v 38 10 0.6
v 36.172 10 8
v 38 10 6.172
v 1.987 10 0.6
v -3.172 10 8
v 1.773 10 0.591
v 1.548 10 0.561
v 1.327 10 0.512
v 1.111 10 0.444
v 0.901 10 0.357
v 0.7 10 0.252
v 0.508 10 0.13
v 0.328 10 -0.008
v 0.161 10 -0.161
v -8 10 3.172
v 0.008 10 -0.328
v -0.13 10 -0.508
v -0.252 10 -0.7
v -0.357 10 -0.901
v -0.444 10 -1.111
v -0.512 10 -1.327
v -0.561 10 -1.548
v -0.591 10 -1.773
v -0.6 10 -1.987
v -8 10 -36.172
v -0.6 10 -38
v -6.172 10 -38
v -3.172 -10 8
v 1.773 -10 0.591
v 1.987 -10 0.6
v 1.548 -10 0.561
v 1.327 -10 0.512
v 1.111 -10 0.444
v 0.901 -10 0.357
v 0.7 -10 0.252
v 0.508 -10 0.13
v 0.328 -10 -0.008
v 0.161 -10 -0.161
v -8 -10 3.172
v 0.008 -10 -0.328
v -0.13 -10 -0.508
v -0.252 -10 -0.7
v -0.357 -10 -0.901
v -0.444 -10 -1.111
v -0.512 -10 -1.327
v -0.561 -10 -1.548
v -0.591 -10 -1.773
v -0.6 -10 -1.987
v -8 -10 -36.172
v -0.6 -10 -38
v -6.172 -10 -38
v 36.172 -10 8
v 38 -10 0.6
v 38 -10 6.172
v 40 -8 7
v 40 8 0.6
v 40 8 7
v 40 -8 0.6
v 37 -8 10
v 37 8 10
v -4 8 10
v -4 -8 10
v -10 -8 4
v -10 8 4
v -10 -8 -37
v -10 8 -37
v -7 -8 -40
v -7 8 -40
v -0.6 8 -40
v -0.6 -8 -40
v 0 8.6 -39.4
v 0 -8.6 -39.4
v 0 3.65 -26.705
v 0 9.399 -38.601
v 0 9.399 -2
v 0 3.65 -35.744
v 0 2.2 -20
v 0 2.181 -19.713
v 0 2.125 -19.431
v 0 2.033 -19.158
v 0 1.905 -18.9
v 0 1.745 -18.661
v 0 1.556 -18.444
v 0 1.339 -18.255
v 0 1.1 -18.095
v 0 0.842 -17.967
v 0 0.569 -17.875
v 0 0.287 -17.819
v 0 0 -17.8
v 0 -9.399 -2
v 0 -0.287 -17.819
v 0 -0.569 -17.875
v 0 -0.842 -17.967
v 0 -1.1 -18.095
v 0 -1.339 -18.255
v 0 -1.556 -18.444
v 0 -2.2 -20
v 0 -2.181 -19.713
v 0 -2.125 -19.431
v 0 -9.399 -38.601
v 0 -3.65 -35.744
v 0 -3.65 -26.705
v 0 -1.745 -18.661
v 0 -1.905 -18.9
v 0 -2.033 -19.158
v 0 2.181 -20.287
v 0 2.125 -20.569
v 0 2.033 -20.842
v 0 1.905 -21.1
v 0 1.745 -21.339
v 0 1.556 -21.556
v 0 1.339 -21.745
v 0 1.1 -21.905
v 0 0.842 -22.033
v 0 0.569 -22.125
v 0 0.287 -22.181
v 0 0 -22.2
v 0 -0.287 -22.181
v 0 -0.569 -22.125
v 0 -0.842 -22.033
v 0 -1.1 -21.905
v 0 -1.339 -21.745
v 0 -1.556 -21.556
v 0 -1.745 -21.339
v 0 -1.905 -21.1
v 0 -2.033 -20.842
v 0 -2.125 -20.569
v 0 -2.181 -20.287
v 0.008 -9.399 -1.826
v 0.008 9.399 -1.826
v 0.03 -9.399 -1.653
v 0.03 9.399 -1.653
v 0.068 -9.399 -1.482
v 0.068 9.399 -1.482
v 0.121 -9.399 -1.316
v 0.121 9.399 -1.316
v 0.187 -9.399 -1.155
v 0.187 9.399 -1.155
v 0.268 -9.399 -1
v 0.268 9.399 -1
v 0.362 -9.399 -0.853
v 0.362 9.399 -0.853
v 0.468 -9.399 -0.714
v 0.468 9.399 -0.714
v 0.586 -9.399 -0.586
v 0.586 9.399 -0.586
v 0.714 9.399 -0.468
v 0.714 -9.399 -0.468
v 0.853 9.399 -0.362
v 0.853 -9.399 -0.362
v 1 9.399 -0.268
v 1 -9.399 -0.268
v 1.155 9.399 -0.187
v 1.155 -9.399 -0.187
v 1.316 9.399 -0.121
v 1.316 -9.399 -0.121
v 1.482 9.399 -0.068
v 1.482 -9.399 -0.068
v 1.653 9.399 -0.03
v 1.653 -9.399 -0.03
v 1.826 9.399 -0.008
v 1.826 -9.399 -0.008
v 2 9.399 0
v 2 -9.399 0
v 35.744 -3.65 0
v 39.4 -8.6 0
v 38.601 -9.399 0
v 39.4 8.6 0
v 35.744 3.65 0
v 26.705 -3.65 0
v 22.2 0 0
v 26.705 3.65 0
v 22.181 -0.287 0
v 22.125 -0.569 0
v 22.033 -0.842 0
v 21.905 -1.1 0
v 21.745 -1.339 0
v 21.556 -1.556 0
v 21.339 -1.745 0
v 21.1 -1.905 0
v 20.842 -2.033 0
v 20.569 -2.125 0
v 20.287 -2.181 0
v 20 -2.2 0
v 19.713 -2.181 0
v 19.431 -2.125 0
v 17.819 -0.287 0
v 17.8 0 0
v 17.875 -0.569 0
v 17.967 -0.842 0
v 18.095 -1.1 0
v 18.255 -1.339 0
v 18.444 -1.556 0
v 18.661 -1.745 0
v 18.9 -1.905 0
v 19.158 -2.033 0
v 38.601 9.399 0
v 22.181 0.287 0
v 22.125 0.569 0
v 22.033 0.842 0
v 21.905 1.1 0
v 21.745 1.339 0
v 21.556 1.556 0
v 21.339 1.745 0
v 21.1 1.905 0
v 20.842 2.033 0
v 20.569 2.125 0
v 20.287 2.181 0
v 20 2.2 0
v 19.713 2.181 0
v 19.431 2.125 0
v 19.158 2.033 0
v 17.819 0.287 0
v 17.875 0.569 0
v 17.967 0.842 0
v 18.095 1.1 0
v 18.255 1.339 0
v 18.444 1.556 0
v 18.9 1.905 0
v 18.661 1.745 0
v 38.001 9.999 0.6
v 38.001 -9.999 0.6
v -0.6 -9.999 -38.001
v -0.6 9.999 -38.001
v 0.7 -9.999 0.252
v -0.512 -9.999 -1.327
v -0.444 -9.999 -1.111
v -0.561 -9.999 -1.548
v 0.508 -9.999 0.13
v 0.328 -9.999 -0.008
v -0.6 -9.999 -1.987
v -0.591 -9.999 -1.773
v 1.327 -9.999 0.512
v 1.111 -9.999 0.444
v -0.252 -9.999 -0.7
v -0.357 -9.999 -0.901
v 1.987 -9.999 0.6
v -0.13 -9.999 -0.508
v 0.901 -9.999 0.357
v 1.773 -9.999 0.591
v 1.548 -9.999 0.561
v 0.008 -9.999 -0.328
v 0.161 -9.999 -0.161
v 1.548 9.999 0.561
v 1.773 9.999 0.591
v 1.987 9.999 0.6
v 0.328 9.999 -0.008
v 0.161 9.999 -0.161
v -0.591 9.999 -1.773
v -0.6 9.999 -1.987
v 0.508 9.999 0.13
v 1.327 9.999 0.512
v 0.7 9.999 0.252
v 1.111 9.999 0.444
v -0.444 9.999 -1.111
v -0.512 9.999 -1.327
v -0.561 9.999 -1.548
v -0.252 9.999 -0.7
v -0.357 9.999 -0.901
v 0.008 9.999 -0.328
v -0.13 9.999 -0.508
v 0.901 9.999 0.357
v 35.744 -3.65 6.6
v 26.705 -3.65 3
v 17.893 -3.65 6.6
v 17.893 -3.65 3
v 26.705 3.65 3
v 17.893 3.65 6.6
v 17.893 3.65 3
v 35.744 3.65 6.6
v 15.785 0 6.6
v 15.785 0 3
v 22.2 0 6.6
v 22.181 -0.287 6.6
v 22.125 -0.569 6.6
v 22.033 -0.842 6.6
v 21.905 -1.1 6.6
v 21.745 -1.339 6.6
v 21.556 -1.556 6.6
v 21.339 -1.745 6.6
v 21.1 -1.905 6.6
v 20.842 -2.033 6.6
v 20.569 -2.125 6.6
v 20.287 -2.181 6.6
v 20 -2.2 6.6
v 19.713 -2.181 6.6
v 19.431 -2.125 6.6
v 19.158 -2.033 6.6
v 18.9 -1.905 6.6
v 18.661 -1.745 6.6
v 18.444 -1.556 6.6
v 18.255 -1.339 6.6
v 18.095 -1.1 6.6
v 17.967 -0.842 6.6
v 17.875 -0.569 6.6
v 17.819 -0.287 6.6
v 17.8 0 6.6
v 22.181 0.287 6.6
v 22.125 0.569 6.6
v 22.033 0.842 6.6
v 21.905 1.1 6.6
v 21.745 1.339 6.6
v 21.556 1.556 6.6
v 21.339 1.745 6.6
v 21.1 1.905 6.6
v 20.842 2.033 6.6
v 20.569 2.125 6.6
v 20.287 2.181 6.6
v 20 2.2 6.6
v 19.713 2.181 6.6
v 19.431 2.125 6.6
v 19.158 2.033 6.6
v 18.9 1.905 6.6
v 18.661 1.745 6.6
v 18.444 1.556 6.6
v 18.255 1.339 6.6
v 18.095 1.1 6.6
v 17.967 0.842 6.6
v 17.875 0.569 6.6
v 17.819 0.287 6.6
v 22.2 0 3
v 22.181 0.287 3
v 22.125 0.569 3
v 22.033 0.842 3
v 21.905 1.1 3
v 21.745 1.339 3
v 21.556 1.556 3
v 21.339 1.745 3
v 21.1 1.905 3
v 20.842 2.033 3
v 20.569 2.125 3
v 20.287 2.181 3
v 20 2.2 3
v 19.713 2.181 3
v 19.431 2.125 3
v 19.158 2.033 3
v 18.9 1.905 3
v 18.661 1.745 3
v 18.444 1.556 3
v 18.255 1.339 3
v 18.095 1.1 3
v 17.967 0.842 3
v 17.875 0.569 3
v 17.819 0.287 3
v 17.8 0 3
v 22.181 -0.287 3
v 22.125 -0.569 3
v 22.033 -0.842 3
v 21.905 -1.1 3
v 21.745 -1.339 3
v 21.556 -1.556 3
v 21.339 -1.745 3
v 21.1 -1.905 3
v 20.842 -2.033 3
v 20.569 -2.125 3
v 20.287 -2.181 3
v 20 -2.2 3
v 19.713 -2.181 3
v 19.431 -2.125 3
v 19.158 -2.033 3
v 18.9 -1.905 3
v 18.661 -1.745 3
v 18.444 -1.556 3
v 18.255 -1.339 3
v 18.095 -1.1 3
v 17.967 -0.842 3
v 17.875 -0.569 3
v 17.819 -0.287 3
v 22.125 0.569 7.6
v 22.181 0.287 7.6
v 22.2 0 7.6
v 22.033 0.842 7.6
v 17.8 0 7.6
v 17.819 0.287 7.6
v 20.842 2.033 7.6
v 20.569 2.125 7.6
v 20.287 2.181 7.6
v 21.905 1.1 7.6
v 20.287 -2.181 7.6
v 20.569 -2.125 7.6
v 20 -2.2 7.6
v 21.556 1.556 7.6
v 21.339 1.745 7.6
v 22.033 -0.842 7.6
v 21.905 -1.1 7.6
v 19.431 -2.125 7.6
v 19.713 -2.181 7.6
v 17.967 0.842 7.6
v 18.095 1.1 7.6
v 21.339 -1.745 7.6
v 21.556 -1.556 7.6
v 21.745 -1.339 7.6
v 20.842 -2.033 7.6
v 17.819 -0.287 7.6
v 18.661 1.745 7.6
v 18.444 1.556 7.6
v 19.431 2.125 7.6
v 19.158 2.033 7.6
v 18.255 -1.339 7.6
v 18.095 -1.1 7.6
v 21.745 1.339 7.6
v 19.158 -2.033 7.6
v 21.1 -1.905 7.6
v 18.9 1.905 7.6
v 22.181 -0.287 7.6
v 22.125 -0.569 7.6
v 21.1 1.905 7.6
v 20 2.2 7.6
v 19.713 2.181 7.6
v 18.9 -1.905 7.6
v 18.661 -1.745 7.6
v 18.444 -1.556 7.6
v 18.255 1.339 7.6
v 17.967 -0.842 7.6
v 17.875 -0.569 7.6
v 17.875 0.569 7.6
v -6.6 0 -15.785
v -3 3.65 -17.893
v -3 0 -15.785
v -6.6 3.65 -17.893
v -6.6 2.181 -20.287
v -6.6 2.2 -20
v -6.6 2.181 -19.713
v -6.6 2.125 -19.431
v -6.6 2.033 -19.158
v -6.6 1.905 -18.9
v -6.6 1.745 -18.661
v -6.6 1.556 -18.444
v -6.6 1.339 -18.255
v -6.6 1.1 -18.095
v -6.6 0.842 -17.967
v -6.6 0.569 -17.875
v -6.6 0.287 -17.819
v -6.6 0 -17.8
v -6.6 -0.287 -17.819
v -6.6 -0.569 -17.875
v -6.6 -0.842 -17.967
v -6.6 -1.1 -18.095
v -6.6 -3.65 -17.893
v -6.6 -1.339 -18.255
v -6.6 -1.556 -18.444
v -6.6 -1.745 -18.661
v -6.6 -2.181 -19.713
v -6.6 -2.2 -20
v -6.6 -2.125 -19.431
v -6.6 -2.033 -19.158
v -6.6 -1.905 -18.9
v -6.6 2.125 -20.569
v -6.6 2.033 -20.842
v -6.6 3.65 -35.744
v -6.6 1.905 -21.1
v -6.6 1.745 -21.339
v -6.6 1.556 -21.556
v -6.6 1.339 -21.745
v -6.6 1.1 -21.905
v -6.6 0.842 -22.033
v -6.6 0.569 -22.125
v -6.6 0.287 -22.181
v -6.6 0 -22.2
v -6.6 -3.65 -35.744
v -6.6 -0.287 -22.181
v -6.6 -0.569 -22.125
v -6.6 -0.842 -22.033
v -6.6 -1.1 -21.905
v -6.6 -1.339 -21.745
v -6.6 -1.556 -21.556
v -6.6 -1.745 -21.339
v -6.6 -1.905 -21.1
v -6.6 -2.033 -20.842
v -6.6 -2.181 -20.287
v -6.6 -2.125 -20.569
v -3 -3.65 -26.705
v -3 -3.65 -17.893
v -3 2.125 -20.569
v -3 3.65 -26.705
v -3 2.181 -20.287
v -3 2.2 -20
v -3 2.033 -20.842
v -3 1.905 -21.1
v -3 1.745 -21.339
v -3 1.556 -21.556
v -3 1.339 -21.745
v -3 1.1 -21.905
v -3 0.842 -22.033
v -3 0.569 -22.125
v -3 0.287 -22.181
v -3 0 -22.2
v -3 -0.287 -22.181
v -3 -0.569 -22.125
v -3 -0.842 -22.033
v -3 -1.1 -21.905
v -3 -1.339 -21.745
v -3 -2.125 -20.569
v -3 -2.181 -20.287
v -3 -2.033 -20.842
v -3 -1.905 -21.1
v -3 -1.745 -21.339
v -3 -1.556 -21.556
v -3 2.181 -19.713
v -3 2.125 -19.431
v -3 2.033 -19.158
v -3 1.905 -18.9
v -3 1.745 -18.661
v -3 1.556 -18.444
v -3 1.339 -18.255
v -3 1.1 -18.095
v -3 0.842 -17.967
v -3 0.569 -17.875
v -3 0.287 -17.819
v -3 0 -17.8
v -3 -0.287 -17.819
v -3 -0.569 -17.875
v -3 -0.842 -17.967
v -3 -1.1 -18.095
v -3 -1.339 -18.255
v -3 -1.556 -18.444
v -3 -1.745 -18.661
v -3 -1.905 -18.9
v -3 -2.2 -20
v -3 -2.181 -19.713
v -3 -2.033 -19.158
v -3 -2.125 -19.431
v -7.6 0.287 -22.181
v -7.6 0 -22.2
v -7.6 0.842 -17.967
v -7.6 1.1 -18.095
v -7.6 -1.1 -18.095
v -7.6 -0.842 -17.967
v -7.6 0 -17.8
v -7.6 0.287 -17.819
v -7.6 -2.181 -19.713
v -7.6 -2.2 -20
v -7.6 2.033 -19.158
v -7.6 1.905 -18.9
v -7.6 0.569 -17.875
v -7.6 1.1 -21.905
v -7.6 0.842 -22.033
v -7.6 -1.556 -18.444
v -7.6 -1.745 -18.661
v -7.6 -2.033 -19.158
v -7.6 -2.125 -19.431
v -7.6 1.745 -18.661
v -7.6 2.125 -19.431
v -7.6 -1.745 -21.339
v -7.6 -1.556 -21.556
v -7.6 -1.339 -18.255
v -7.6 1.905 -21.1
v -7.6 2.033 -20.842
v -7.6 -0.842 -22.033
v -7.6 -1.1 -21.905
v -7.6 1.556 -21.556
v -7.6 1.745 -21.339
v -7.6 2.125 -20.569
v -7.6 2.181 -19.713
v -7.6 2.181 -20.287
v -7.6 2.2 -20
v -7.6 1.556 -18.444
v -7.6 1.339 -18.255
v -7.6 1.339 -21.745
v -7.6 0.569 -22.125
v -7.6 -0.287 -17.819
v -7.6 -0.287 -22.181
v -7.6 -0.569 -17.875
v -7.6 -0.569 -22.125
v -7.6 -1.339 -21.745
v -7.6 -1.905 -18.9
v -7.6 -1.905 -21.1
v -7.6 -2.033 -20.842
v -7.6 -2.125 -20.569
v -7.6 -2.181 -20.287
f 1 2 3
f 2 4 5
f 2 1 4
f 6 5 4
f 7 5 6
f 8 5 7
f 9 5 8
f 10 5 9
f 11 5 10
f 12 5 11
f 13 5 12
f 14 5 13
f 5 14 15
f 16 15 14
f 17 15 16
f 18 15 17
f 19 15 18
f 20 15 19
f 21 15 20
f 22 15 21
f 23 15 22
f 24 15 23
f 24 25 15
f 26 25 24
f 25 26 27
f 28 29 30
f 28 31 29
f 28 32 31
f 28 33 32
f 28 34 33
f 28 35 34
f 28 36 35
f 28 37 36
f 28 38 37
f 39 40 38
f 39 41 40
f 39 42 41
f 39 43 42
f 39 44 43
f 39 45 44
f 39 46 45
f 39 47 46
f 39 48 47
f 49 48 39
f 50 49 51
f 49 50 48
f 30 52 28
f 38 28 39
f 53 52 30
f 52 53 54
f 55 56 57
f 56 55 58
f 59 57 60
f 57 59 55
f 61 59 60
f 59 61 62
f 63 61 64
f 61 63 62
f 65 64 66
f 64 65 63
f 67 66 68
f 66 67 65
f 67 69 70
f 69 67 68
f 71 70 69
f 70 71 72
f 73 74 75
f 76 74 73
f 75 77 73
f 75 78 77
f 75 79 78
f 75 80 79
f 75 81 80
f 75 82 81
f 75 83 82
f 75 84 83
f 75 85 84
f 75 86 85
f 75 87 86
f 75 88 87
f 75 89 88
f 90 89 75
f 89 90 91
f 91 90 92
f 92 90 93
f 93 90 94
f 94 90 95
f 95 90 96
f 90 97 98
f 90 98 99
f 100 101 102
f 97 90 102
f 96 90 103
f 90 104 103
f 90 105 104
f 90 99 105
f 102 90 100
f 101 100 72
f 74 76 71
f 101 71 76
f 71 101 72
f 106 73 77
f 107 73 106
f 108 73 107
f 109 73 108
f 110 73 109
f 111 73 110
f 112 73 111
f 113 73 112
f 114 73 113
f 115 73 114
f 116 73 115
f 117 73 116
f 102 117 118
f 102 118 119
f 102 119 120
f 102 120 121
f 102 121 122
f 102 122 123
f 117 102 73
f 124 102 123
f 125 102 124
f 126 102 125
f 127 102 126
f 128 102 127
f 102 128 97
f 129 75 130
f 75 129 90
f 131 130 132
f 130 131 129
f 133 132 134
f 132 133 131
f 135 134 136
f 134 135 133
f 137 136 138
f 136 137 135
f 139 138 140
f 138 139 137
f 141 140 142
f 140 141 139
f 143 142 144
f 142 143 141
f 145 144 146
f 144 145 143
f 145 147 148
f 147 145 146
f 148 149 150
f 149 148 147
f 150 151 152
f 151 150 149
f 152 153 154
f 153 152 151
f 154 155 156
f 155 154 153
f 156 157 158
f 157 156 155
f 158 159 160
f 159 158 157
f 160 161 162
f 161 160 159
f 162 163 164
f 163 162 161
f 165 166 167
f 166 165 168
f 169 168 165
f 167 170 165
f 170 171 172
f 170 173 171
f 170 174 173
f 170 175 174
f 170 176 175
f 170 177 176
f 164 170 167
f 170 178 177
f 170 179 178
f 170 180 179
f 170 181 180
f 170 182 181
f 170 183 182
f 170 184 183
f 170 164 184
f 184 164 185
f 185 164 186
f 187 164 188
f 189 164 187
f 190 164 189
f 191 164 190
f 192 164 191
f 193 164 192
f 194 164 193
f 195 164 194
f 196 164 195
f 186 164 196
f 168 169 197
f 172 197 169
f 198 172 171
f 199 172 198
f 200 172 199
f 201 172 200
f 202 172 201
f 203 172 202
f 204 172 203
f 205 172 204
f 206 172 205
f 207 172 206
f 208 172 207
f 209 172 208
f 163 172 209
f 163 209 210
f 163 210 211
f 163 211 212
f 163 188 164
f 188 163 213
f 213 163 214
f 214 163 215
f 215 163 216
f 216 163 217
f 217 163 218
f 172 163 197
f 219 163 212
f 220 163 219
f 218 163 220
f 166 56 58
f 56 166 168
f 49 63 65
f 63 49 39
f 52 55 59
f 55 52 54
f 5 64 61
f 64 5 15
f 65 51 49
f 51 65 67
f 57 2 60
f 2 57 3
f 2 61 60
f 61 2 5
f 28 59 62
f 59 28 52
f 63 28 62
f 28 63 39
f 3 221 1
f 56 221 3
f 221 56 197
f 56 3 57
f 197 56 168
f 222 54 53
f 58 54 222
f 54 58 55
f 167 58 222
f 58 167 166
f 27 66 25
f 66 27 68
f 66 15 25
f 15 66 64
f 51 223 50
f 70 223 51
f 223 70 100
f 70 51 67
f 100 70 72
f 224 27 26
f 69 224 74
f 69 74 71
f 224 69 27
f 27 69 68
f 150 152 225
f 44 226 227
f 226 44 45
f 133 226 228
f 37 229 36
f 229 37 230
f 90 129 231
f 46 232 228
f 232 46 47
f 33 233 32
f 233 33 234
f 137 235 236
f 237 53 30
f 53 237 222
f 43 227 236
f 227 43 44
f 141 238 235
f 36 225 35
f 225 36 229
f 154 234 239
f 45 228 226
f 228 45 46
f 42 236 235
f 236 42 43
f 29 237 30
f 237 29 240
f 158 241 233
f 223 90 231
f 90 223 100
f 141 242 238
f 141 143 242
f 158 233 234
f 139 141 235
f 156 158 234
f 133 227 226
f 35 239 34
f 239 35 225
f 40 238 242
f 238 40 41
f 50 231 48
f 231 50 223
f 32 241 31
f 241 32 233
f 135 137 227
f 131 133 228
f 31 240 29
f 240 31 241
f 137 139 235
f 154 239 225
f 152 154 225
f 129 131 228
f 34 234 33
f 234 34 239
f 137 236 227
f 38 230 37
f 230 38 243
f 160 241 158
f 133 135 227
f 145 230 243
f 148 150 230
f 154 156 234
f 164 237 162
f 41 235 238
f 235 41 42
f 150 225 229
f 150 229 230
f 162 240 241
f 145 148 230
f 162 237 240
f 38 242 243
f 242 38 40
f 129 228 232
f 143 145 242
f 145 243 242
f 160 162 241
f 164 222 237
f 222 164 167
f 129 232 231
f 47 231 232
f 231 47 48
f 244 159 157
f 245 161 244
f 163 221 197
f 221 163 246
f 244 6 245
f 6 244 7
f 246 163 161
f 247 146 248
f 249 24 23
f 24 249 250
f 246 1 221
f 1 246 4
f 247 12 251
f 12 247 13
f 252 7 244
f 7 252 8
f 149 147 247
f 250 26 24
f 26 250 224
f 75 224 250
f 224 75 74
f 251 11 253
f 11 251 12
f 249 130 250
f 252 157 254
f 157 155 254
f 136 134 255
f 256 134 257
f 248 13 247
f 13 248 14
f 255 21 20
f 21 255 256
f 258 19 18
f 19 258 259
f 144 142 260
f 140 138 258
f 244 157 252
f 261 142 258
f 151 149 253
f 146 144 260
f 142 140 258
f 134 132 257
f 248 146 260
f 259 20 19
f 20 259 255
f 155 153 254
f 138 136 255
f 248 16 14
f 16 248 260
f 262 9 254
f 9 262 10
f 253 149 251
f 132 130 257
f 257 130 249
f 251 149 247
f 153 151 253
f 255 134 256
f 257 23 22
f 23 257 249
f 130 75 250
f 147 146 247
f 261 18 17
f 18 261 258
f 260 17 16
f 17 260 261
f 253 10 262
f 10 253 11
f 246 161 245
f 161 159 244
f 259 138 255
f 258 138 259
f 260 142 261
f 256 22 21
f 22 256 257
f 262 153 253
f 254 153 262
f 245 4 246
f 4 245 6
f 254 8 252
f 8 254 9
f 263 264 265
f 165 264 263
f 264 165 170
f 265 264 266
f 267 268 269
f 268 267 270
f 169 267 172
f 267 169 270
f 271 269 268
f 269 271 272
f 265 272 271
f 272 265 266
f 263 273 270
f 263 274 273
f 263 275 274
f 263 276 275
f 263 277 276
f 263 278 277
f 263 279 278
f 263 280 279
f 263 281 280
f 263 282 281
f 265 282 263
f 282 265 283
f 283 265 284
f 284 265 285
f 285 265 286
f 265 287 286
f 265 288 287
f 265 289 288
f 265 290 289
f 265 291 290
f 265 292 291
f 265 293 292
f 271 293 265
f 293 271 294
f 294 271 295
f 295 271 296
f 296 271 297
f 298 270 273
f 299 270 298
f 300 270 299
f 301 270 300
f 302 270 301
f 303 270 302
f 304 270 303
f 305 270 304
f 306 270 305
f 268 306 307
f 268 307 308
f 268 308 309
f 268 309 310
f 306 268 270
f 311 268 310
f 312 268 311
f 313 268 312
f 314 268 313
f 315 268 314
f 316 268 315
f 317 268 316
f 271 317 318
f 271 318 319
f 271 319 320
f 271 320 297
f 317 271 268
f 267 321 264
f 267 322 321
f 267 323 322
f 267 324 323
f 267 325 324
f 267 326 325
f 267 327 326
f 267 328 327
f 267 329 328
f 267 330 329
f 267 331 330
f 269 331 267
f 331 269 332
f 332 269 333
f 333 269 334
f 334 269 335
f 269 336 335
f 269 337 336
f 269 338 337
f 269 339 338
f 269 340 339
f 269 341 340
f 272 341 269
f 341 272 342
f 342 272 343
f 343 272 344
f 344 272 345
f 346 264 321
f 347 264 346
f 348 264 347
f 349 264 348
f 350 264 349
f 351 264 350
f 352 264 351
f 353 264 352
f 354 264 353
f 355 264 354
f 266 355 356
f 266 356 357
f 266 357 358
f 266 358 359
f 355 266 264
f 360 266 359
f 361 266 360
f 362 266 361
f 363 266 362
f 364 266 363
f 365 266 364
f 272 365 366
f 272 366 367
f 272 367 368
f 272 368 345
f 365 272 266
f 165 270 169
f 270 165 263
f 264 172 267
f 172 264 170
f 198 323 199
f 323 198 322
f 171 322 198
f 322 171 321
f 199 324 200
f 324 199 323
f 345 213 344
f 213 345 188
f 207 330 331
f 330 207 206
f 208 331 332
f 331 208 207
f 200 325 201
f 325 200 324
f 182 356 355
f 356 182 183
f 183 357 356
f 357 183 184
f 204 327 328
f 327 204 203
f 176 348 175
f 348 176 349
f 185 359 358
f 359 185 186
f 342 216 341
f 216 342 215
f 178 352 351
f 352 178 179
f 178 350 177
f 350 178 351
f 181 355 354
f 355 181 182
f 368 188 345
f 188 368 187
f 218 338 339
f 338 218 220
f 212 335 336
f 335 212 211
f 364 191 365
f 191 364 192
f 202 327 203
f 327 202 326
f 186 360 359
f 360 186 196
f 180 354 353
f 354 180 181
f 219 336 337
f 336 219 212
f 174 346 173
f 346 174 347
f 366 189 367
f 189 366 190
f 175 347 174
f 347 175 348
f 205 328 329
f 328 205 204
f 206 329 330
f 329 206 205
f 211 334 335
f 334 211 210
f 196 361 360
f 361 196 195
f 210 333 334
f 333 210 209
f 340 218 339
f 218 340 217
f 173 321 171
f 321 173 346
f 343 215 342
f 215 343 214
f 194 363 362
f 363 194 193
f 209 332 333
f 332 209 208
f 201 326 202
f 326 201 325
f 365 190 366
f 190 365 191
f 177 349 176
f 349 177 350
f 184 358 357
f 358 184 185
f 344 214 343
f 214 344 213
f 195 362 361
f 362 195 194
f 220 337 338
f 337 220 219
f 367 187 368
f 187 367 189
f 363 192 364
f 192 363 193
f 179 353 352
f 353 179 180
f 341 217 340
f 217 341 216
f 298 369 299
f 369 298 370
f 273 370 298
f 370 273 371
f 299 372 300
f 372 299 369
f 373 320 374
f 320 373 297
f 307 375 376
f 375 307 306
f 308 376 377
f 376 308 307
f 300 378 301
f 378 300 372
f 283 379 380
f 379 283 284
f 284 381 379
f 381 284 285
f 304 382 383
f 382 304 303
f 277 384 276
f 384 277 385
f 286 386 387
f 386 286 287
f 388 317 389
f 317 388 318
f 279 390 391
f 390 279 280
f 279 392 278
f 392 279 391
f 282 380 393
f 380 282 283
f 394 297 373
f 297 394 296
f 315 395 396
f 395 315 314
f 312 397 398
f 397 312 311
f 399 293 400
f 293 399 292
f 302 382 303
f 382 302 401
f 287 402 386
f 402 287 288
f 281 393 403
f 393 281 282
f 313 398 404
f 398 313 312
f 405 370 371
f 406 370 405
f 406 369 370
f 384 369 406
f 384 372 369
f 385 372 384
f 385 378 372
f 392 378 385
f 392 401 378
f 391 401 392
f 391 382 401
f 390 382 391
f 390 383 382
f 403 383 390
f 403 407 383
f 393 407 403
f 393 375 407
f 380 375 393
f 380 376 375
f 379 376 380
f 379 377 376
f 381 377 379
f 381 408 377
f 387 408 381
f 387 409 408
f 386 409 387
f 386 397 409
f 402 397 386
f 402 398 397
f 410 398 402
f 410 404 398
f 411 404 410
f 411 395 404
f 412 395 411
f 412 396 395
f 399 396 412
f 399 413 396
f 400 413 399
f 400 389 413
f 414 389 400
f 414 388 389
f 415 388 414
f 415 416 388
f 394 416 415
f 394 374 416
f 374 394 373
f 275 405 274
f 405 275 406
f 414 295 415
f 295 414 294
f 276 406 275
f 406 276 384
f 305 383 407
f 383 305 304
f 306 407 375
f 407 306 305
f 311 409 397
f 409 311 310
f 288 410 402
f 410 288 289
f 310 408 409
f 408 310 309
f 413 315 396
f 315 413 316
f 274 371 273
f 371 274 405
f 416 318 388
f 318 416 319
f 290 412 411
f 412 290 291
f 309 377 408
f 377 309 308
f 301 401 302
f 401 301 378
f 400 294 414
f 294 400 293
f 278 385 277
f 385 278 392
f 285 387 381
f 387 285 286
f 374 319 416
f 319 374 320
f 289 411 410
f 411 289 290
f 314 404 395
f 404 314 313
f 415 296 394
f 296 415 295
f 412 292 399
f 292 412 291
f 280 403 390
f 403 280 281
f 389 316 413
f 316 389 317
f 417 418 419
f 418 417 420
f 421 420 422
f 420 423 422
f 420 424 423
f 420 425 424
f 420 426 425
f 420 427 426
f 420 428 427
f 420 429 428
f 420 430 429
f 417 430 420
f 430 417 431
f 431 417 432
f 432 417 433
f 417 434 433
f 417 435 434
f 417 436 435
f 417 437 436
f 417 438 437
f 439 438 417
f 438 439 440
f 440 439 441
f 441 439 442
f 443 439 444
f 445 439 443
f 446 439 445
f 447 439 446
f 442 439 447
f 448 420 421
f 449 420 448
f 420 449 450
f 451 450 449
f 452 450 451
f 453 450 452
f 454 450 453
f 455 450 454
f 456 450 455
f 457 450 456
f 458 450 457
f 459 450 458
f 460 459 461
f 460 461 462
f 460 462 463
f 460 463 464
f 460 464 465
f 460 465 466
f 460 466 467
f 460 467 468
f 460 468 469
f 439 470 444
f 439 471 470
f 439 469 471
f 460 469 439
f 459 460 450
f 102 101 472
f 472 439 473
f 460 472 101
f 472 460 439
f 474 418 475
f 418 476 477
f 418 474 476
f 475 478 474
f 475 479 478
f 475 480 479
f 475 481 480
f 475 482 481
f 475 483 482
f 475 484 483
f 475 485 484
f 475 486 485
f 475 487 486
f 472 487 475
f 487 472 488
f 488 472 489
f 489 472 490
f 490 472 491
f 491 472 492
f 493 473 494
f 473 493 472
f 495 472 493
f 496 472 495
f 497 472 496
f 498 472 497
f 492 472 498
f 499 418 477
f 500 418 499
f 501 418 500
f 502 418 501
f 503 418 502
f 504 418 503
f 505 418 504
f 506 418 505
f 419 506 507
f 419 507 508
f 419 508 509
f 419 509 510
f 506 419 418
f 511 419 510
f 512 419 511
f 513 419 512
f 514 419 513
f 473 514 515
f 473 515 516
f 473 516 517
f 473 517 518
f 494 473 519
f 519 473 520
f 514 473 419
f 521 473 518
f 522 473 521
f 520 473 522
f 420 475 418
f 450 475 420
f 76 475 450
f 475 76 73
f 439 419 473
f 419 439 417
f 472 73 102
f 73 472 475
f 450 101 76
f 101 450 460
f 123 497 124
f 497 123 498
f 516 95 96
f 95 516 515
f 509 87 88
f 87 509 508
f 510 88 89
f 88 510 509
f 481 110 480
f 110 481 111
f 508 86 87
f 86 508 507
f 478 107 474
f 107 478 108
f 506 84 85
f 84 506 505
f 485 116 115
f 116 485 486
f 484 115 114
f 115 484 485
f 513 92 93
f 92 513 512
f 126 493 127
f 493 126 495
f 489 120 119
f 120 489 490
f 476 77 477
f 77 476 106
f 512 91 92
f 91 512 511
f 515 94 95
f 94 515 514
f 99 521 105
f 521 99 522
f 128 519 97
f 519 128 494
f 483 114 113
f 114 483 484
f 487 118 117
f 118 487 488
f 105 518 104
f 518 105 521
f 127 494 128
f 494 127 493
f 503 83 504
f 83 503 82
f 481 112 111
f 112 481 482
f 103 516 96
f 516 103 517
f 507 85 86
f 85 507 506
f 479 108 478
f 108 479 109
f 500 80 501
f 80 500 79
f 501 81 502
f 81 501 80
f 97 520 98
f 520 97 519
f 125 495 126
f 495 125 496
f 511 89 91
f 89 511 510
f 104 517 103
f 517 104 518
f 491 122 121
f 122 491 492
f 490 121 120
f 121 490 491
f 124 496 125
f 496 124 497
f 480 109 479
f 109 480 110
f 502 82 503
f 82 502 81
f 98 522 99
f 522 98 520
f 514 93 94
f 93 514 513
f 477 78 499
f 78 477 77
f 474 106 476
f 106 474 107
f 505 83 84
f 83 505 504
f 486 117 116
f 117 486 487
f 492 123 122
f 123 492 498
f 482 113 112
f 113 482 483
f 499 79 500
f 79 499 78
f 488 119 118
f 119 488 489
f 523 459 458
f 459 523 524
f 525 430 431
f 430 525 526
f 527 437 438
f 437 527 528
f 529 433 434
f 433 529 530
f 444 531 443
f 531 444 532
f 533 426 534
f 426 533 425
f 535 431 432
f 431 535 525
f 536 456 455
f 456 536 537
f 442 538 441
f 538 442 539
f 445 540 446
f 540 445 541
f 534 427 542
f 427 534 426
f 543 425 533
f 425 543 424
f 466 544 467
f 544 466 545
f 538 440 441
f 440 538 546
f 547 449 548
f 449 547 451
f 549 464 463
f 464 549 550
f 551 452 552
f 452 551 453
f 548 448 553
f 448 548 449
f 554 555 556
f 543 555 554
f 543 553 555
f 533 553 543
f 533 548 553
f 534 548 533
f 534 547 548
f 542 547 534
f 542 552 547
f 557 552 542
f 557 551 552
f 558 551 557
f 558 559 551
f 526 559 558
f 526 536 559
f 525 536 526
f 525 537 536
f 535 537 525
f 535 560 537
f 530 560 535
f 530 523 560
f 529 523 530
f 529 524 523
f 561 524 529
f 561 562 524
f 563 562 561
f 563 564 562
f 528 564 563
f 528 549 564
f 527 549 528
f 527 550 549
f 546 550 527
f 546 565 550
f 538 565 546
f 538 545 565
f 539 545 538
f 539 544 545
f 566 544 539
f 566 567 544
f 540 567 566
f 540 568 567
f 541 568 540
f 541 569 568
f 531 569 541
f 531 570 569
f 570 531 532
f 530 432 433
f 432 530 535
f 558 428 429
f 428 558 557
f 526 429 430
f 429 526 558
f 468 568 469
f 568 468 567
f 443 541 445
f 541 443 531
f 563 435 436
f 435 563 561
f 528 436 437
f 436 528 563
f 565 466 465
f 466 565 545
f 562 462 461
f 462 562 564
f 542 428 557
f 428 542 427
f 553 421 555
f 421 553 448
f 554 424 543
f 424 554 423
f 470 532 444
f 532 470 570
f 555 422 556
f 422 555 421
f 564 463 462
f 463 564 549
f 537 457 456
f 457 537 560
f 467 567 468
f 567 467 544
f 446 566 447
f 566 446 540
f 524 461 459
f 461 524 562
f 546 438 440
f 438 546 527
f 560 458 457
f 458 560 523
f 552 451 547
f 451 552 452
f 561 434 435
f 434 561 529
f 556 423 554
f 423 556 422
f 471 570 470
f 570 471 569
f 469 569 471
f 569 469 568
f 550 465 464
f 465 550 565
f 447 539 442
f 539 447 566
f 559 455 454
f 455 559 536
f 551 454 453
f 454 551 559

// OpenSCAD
// file: inspection.scad
// Optional section clipping for OpenSCAD Customizer inspection.
// The bracket's default "None" mode passes the geometry through unchanged.
// For X/Y/Z, intersect geometry with a slab of the requested depth in mm.
module util_section_inspect(axis = "None", position_mm = 0, depth_mm = 10, direction = "Positive") {
    if (axis == "None")
        children();
    else {
        extent = 10000;
        low = (direction == "Negative") ? position_mm - depth_mm : position_mm;
        intersection() {
            children();
            if (axis == "X")
                translate([low, -extent / 2, -extent / 2])
                    cube([depth_mm, extent, extent]);
            else if (axis == "Y")
                translate([-extent / 2, low, -extent / 2])
                    cube([extent, depth_mm, extent]);
            else if (axis == "Z")
                translate([-extent / 2, -extent / 2, low])
                    cube([extent, extent, depth_mm]);
        }
    }
}
// main file
// Outside-corner L bracket for plywood joints.
// All dimensions are in millimetres. Adjust settings in the OpenSCAD Customizer.
//
// Side view (X to the right, Z upwards), with wood inside the bracket:
//
//     ____________________        <- bracket, top arm (outside the horizontal panel)
//    /  ##################
//   |  ||==================      <- horizontal plywood panel (10 mm)
//   |  ||
//   |  ||  vertical plywood panel
//   |  ||
//    bracket, vertical arm (outside the upright panel)
//
// Bolts enter from inside the plywood and thread into captive nuts in the bracket.
// Insert a nut through the access window on the wood-facing side of the bracket,
// slide it under the 3 mm retaining wall and push it against the stop.
// Hook the plug tab under the retaining lip, then press the opposite end down.
// The plywood covers the window; the outside face of the bracket stays solid.
//
// PRINTING: put the bracket on one flat side and the plugs on their sides.
// This lets layer lines follow the part outlines for improved strength.
//
// Requires inspection.scad in this directory for the optional section view.

use <inspection.scad>

/* [Display] */
part       = "bracket"; // [bracket, plug]
show_wood  = true;     // translucent plywood preview; excluded from STL
show_plugs = false;    // display fitted plugs; excluded from STL
part_color = [0.29, 0.56, 0.72]; // color
plug_color = [0.93, 0.58, 0.22]; // color

/* [Section inspection] */
c_section_axis        = "None";     // [None, X, Y, Z]
c_section_position_mm = 0;          // [-60:0.5:60]
c_section_depth_mm    = 10;         // [0.1:0.1:80]
c_section_direction   = "Positive"; // [Positive, Negative]

/* [Plywood] */
ply_t    = 10;     // plywood thickness
wood_w   = 60;     // panel width, display only
wood_len = 80;     // panel length, display only

/* [Bracket geometry] */
W        = 20;     // bracket width
t        = 10;     // bracket wall thickness
armH     = 40;     // length of top arm from the outer plywood end
armV     = 40;     // length of vertical arm from the top of horizontal plywood
ce       = 6;      // 45-degree outer corner chamfer (6 gives 9.9 mm diagonal wall)
c        = 3;      // 45-degree chamfer at outer arm ends
cs       = 2;      // 45-degree side-edge chamfers; 0 disables

/* [Print compensation] */
ef       = 0.6;    // 45-degree elephant-foot relief on print-facing sides; 0 disables
r_in     = 2.0;    // inside corner radius: plywood must be rounded at least this much; 0 or >=1

/* [Bolt and captive nut] */
bolt_edge = 10;    // bolt position beyond the inner face of the other panel
nut_type  = "hex"; // [hex, square]
bolt_d    = 4;
bolt_clr  = 0.4;   // bolt-hole clearance
nut_flats = 7;     // M4 nut across flats; measure your actual nuts
nut_h     = 3.2;   // nominal M4 nut thickness
nut_clr   = 0.3;   // captive-nut pocket clearance
wood_wall = 3;     // load-bearing wall between plywood and nut
tip_hole  = 1;     // blind hole for extra bolt length beyond the nut
                   // (M4x16 nominal fit; outer skin = t - wood_wall - pocket_h - tip_hole)

/* [Window plug] */
plug_clr    = 0.15; // clearance around access plug
lip_len     = 2.5;  // free slot from captive nut to window for plug's hooked tab
lip_thk     = 2.4;  // tab thickness
win_extra   = 0.6;  // extra window length to allow angled plug insertion
plug_ch     = 1.0;  // 45-degree bevel on far end of plug for insertion
plug_handle = "hole"; // [hole, slot, none] hole = pin/screw opening, slot = screwdriver notch

/* [Hidden] */
$fn = 48;

// ---------- Derived dimensions ----------
Wn       = nut_flats + nut_clr;   // nut pocket width (across flats)
Ln       = (nut_type == "hex") ? Wn / cos(30) : Wn;   // pocket length (hex vertex-to-vertex)
pocket_h = nut_h + 0.4;           // nut-pocket depth
skin     = t - wood_wall - pocket_h - tip_hole;   // closed outside wall
D        = wood_wall + pocket_h;  // window depth from wood-facing surface
Lw       = Ln + win_extra;        // window length
lip_l    = lip_len - 0.2;         // plug tab length

hx = ply_t + bolt_edge;           // top-arm bolt X position
vz = -(ply_t + bolt_edge);        // vertical-arm bolt Z position
tip_x = hx + Ln / 2 + lip_len;    // top-arm window start
tip_z = vz - Ln / 2 - lip_len;    // vertical-arm window start

echo("Outer skin behind nut (mm):", skin);
echo("Window end (mm):", tip_x + Lw, " arm length:", armH);

// ---------- Plywood preview (joint corner at origin) ----------
module wood() {
    color("burlywood", 0.45) difference() {
        union() {
            translate([0, -wood_w / 2, -ply_t]) cube([wood_len, wood_w, ply_t]);
            translate([0, -wood_w / 2, -wood_len]) cube([ply_t, wood_w, wood_len - ply_t]);
        }
        translate([hx, 0, -ply_t - 1]) cylinder(d = bolt_d + bolt_clr, h = ply_t + 2);
        translate([-1, 0, vz]) rotate([0, 90, 0]) cylinder(d = bolt_d + bolt_clr, h = ply_t + 2);
        // Remove material at the inside corner to match the bracket radius.
        if (r_in > 0) difference() {
            translate([-1, -wood_w / 2 - 1, -r_in]) cube([r_in + 1, wood_w + 2, r_in + 1]);
            translate([r_in, 0, -r_in]) rotate([90, 0, 0]) cylinder(r = r_in, h = wood_w + 4, center = true);
        }
    }
}

// ---------- Bracket side profile ----------
// Make the inside fillet from ordinary 2D shapes, before extrusion.
// The square sits in the open part of the L, at the sharp inner corner.
// Subtracting a circle leaves only the small curved region to add.
// Keep 72 segments (5 degrees each) to match the legacy 19-point arc.
module inside_corner_2d(r) {
    difference() {
        translate([0, -r]) square([r, r]);
        translate([r, -r]) circle(r = r, $fn = 72);
    }
}

// End edges also receive elephant-foot relief so the wood-facing bevel
// continues around side edges, ends, and the inside corner.
tip_top  = (ef > 0) ? [[armH - ef, 0], [armH, ef]] : [[armH, 0]];
tip_vert = (ef > 0) ? [[-ef, -armV], [0, -armV + ef]] : [[0, -armV]];

// Draw the unchanged L outline with a sharp inside corner at (0,0).
// The arm-end and outside-corner chamfers are part of this outline.
module sharp_profile() {
    polygon(concat(tip_top, [
        [armH, t - c],            // 45-degree top-arm end
        [armH - c, t],
        [-t + ce, t],
        [-t, t - ce],             // 45-degree outside corner
        [-t, -armV + c],
        [-t + c, -armV]           // 45-degree vertical-arm end
    ], tip_vert, [[0, 0]]));
}

// Complete the side profile in 2D, then extrude it in profile_extrusion().
// Radius zero leaves the original sharp corner without creating a square.
module profile() {
    union() {
        sharp_profile();
        if (r_in > 0) inside_corner_2d(r_in);
    }
}

// Convex envelope of the bracket with its inside corner filled in. Side
// chamfers affect the outer edges only; the wood-facing area stays flat.
module outer_shape() {
    polygon([
        [armH, -armV], [armH, t - c], [armH - c, t], [-t + ce, t],
        [-t, t - ce], [-t, -armV + c], [-t + c, -armV]
    ]);
}

module side_chamfer_env() {
    rotate([90, 0, 0]) hull() {
        linear_extrude(height = W - 2 * cs, center = true) outer_shape();
        linear_extrude(height = W, center = true) offset(delta = -cs) outer_shape();
    }
}

// Plain extruded side profile before side chamfers or pockets.
module profile_extrusion() {
    rotate([90, 0, 0])
        linear_extrude(height = W, center = true)
            profile();
}

module body() {
    intersection() {
        rotate([90, 0, 0]) linear_extrude(height = W, center = true) profile();
        if (cs > 0) side_chamfer_env();
        else rotate([90, 0, 0]) linear_extrude(height = W, center = true) outer_shape();
    }
}

// ---------- Unified hull-based side chamfers and print relief ----------
// The broad outside edges are controlled by side_chamfer_env() above.
// For the *concave*, wood-facing edges, use the complement: the open
// quadrant between the two arms, less the small rounded corner fill.
// Its boundary includes both straight contact faces and the inner arc.
// We extend the quadrant beyond the arm ends so the bevel is not clipped.
module inside_opening_2d() {
    reach = max(5, cs + ef + 1);
    difference() {
        translate([0, -armV - reach])
            square([armH + reach, armV + reach]);
        if (r_in > 0)
            inside_corner_2d(r_in);
    }
}

// A thin 3D slice of the open space at one position across the Y width.
// A larger 2D opening at the printed side removes an ef-sized amount
// from the wood-contact boundary without changing the middle of the part.
module opening_layer(y, expansion = 0) {
    translate([0, y, 0])
        rotate([90, 0, 0])
            linear_extrude(height = 0.002, center = true)
                offset(delta = expansion)
                    inside_opening_2d();
}

// Why TWO hulls? A single convex hull joining expanded openings at BOTH
// outside Y faces would also enlarge the opening all through the middle.
// Each side must have its own local transition from normal to expanded.
module inside_relief_envelope() {
    if (ef > 0)
        for (side = [-1, 1])
            hull() {
                opening_layer(side * (W / 2 - ef));
                opening_layer(side * W / 2, ef);
            }
}

// Both kinds of chamfer now use hull-based limiting volumes: the outside
// envelope in body() and these two narrow inner-opening transitions.
// This replaces the separate straight, diagonal and rotate_extrude()
// elephant-foot cutters, including the relief at the rounded inside corner.
module chamfered_body() {
    difference() {
        body();
        if (ef > 0)
            inside_relief_envelope();
    }
}

// ---------- Captive-nut pocket with window on wood-facing side ----------
// The nut pocket lies behind wood_wall. A free slot connects the pocket
// to the access window. Slide the nut through the window towards the corner,
// then hook the plug tab into the slot.

// Top arm: bolt along Z.
module nut_top() {
    z0 = wood_wall;
    if (nut_type == "hex") {
        translate([hx, 0, z0]) cylinder(d = Ln, h = pocket_h, $fn = 6);
        translate([hx, -Wn / 2, z0]) cube([Ln / 2 + lip_len + 0.02, Wn, pocket_h]);
    } else
        translate([hx - Ln / 2, -Wn / 2, z0]) cube([Ln + lip_len + 0.02, Wn, pocket_h]);
    // Window opening from the wood-facing surface.
    translate([tip_x - 0.01, -Wn / 2, -0.01]) cube([Lw + 0.01, Wn, D + 0.01]);
    // Bolt hole through retaining wall plus blind clearance behind nut.
    translate([hx, 0, -1]) cylinder(d = bolt_d + bolt_clr, h = wood_wall + 2);
    translate([hx, 0, z0 + pocket_h - 0.01]) cylinder(d = bolt_d + bolt_clr, h = tip_hole + 0.01);
}

// Vertical arm: bolt along X.
module nut_side() {
    x0 = -D;
    if (nut_type == "hex") {
        translate([x0, 0, vz]) rotate([0, 90, 0]) cylinder(d = Ln, h = pocket_h, $fn = 6);
        translate([x0, -Wn / 2, tip_z - 0.02]) cube([pocket_h, Wn, Ln / 2 + lip_len + 0.02]);
    } else
        translate([x0, -Wn / 2, tip_z - 0.02]) cube([pocket_h, Wn, Ln + lip_len + 0.02]);
    // Window opening from the wood-facing surface.
    translate([x0, -Wn / 2, tip_z - Lw]) cube([D + 0.01, Wn, Lw + 0.01]);
    // Bolt hole through retaining wall plus blind clearance behind nut.
    translate([1, 0, vz]) rotate([0, -90, 0]) cylinder(d = bolt_d + bolt_clr, h = wood_wall + 2);
    translate([x0 + 0.01, 0, vz]) rotate([0, -90, 0]) cylinder(d = bolt_d + bolt_clr, h = tip_hole + 0.01);
}

module bracket() {
    difference() {
        chamfered_body();
        nut_top();
        nut_side();
    }
}

// ---------- Access-window plug ----------
// Window-local coordinates: u runs along the arm towards its end (0=start),
// v is transverse (Y), and w is depth from the wood-facing surface.
// The tab at u<0 engages the slot under the retaining wall.
// Insert the tab at an angle, then press the far end flush with the wood face.
module plug_local() {
    pc = plug_clr;
    pw = Wn - 2 * pc;
    difference() {
        rotate([90, 0, 0]) linear_extrude(height = pw, center = true)
            polygon([
                [pc, 0], [Lw - pc, 0],
                [Lw - pc, D - pc - plug_ch], [Lw - pc - plug_ch, D - pc],   // insertion bevel
                [-lip_l, D - pc],                                           // bottom face and tab
                [-lip_l, D - pc - lip_thk], [pc, D - pc - lip_thk]
            ]);
        // Extraction hole (pin/small screw) or screwdriver slot.
        if (plug_handle == "hole") translate([Lw / 2, 0, -1]) cylinder(d = 2.5, h = 5, $fn = 24);
        if (plug_handle == "slot") translate([Lw - pc - 3, -pw / 2 - 1, -1]) cube([1.2, pw + 2, 3]);
    }
}

// Lay plugs on their sides for printing; layer lines run through each tab.
module plug_print() {
    translate([lip_l, D, (Wn - 2 * plug_clr) / 2]) rotate([90, 0, 0]) plug_local();
}

// Two separate plugs positioned for printing and documentation exports.
module plugs_print_pair() {
    for (i = [0, 1])
        translate([i * (Lw + lip_l + 4), 0, 0])
            plug_print();
}

// Show installed plugs in the access windows for visual inspection only.
module plugs_in_place() {
    translate([tip_x, 0, 0]) plug_local();
    multmatrix([[0, 0, -1, 0], [0, -1, 0, 0], [-1, 0, 0, tip_z], [0, 0, 0, 1]]) plug_local();
}

// ===== DISPLAY / PRINT-PART SELECTOR =====
if (part == "plug") {
    util_section_inspect(c_section_axis, c_section_position_mm, c_section_depth_mm, c_section_direction)
        color(plug_color)
            plugs_print_pair();
} else {
    util_section_inspect(c_section_axis, c_section_position_mm, c_section_depth_mm, c_section_direction)
        color(part_color) bracket();
    if (show_wood)
        %util_section_inspect(c_section_axis, c_section_position_mm, c_section_depth_mm, c_section_direction)
            wood();
    if (show_plugs)
        %util_section_inspect(c_section_axis, c_section_position_mm, c_section_depth_mm, c_section_direction)
            color(plug_color) plugs_in_place();
}
